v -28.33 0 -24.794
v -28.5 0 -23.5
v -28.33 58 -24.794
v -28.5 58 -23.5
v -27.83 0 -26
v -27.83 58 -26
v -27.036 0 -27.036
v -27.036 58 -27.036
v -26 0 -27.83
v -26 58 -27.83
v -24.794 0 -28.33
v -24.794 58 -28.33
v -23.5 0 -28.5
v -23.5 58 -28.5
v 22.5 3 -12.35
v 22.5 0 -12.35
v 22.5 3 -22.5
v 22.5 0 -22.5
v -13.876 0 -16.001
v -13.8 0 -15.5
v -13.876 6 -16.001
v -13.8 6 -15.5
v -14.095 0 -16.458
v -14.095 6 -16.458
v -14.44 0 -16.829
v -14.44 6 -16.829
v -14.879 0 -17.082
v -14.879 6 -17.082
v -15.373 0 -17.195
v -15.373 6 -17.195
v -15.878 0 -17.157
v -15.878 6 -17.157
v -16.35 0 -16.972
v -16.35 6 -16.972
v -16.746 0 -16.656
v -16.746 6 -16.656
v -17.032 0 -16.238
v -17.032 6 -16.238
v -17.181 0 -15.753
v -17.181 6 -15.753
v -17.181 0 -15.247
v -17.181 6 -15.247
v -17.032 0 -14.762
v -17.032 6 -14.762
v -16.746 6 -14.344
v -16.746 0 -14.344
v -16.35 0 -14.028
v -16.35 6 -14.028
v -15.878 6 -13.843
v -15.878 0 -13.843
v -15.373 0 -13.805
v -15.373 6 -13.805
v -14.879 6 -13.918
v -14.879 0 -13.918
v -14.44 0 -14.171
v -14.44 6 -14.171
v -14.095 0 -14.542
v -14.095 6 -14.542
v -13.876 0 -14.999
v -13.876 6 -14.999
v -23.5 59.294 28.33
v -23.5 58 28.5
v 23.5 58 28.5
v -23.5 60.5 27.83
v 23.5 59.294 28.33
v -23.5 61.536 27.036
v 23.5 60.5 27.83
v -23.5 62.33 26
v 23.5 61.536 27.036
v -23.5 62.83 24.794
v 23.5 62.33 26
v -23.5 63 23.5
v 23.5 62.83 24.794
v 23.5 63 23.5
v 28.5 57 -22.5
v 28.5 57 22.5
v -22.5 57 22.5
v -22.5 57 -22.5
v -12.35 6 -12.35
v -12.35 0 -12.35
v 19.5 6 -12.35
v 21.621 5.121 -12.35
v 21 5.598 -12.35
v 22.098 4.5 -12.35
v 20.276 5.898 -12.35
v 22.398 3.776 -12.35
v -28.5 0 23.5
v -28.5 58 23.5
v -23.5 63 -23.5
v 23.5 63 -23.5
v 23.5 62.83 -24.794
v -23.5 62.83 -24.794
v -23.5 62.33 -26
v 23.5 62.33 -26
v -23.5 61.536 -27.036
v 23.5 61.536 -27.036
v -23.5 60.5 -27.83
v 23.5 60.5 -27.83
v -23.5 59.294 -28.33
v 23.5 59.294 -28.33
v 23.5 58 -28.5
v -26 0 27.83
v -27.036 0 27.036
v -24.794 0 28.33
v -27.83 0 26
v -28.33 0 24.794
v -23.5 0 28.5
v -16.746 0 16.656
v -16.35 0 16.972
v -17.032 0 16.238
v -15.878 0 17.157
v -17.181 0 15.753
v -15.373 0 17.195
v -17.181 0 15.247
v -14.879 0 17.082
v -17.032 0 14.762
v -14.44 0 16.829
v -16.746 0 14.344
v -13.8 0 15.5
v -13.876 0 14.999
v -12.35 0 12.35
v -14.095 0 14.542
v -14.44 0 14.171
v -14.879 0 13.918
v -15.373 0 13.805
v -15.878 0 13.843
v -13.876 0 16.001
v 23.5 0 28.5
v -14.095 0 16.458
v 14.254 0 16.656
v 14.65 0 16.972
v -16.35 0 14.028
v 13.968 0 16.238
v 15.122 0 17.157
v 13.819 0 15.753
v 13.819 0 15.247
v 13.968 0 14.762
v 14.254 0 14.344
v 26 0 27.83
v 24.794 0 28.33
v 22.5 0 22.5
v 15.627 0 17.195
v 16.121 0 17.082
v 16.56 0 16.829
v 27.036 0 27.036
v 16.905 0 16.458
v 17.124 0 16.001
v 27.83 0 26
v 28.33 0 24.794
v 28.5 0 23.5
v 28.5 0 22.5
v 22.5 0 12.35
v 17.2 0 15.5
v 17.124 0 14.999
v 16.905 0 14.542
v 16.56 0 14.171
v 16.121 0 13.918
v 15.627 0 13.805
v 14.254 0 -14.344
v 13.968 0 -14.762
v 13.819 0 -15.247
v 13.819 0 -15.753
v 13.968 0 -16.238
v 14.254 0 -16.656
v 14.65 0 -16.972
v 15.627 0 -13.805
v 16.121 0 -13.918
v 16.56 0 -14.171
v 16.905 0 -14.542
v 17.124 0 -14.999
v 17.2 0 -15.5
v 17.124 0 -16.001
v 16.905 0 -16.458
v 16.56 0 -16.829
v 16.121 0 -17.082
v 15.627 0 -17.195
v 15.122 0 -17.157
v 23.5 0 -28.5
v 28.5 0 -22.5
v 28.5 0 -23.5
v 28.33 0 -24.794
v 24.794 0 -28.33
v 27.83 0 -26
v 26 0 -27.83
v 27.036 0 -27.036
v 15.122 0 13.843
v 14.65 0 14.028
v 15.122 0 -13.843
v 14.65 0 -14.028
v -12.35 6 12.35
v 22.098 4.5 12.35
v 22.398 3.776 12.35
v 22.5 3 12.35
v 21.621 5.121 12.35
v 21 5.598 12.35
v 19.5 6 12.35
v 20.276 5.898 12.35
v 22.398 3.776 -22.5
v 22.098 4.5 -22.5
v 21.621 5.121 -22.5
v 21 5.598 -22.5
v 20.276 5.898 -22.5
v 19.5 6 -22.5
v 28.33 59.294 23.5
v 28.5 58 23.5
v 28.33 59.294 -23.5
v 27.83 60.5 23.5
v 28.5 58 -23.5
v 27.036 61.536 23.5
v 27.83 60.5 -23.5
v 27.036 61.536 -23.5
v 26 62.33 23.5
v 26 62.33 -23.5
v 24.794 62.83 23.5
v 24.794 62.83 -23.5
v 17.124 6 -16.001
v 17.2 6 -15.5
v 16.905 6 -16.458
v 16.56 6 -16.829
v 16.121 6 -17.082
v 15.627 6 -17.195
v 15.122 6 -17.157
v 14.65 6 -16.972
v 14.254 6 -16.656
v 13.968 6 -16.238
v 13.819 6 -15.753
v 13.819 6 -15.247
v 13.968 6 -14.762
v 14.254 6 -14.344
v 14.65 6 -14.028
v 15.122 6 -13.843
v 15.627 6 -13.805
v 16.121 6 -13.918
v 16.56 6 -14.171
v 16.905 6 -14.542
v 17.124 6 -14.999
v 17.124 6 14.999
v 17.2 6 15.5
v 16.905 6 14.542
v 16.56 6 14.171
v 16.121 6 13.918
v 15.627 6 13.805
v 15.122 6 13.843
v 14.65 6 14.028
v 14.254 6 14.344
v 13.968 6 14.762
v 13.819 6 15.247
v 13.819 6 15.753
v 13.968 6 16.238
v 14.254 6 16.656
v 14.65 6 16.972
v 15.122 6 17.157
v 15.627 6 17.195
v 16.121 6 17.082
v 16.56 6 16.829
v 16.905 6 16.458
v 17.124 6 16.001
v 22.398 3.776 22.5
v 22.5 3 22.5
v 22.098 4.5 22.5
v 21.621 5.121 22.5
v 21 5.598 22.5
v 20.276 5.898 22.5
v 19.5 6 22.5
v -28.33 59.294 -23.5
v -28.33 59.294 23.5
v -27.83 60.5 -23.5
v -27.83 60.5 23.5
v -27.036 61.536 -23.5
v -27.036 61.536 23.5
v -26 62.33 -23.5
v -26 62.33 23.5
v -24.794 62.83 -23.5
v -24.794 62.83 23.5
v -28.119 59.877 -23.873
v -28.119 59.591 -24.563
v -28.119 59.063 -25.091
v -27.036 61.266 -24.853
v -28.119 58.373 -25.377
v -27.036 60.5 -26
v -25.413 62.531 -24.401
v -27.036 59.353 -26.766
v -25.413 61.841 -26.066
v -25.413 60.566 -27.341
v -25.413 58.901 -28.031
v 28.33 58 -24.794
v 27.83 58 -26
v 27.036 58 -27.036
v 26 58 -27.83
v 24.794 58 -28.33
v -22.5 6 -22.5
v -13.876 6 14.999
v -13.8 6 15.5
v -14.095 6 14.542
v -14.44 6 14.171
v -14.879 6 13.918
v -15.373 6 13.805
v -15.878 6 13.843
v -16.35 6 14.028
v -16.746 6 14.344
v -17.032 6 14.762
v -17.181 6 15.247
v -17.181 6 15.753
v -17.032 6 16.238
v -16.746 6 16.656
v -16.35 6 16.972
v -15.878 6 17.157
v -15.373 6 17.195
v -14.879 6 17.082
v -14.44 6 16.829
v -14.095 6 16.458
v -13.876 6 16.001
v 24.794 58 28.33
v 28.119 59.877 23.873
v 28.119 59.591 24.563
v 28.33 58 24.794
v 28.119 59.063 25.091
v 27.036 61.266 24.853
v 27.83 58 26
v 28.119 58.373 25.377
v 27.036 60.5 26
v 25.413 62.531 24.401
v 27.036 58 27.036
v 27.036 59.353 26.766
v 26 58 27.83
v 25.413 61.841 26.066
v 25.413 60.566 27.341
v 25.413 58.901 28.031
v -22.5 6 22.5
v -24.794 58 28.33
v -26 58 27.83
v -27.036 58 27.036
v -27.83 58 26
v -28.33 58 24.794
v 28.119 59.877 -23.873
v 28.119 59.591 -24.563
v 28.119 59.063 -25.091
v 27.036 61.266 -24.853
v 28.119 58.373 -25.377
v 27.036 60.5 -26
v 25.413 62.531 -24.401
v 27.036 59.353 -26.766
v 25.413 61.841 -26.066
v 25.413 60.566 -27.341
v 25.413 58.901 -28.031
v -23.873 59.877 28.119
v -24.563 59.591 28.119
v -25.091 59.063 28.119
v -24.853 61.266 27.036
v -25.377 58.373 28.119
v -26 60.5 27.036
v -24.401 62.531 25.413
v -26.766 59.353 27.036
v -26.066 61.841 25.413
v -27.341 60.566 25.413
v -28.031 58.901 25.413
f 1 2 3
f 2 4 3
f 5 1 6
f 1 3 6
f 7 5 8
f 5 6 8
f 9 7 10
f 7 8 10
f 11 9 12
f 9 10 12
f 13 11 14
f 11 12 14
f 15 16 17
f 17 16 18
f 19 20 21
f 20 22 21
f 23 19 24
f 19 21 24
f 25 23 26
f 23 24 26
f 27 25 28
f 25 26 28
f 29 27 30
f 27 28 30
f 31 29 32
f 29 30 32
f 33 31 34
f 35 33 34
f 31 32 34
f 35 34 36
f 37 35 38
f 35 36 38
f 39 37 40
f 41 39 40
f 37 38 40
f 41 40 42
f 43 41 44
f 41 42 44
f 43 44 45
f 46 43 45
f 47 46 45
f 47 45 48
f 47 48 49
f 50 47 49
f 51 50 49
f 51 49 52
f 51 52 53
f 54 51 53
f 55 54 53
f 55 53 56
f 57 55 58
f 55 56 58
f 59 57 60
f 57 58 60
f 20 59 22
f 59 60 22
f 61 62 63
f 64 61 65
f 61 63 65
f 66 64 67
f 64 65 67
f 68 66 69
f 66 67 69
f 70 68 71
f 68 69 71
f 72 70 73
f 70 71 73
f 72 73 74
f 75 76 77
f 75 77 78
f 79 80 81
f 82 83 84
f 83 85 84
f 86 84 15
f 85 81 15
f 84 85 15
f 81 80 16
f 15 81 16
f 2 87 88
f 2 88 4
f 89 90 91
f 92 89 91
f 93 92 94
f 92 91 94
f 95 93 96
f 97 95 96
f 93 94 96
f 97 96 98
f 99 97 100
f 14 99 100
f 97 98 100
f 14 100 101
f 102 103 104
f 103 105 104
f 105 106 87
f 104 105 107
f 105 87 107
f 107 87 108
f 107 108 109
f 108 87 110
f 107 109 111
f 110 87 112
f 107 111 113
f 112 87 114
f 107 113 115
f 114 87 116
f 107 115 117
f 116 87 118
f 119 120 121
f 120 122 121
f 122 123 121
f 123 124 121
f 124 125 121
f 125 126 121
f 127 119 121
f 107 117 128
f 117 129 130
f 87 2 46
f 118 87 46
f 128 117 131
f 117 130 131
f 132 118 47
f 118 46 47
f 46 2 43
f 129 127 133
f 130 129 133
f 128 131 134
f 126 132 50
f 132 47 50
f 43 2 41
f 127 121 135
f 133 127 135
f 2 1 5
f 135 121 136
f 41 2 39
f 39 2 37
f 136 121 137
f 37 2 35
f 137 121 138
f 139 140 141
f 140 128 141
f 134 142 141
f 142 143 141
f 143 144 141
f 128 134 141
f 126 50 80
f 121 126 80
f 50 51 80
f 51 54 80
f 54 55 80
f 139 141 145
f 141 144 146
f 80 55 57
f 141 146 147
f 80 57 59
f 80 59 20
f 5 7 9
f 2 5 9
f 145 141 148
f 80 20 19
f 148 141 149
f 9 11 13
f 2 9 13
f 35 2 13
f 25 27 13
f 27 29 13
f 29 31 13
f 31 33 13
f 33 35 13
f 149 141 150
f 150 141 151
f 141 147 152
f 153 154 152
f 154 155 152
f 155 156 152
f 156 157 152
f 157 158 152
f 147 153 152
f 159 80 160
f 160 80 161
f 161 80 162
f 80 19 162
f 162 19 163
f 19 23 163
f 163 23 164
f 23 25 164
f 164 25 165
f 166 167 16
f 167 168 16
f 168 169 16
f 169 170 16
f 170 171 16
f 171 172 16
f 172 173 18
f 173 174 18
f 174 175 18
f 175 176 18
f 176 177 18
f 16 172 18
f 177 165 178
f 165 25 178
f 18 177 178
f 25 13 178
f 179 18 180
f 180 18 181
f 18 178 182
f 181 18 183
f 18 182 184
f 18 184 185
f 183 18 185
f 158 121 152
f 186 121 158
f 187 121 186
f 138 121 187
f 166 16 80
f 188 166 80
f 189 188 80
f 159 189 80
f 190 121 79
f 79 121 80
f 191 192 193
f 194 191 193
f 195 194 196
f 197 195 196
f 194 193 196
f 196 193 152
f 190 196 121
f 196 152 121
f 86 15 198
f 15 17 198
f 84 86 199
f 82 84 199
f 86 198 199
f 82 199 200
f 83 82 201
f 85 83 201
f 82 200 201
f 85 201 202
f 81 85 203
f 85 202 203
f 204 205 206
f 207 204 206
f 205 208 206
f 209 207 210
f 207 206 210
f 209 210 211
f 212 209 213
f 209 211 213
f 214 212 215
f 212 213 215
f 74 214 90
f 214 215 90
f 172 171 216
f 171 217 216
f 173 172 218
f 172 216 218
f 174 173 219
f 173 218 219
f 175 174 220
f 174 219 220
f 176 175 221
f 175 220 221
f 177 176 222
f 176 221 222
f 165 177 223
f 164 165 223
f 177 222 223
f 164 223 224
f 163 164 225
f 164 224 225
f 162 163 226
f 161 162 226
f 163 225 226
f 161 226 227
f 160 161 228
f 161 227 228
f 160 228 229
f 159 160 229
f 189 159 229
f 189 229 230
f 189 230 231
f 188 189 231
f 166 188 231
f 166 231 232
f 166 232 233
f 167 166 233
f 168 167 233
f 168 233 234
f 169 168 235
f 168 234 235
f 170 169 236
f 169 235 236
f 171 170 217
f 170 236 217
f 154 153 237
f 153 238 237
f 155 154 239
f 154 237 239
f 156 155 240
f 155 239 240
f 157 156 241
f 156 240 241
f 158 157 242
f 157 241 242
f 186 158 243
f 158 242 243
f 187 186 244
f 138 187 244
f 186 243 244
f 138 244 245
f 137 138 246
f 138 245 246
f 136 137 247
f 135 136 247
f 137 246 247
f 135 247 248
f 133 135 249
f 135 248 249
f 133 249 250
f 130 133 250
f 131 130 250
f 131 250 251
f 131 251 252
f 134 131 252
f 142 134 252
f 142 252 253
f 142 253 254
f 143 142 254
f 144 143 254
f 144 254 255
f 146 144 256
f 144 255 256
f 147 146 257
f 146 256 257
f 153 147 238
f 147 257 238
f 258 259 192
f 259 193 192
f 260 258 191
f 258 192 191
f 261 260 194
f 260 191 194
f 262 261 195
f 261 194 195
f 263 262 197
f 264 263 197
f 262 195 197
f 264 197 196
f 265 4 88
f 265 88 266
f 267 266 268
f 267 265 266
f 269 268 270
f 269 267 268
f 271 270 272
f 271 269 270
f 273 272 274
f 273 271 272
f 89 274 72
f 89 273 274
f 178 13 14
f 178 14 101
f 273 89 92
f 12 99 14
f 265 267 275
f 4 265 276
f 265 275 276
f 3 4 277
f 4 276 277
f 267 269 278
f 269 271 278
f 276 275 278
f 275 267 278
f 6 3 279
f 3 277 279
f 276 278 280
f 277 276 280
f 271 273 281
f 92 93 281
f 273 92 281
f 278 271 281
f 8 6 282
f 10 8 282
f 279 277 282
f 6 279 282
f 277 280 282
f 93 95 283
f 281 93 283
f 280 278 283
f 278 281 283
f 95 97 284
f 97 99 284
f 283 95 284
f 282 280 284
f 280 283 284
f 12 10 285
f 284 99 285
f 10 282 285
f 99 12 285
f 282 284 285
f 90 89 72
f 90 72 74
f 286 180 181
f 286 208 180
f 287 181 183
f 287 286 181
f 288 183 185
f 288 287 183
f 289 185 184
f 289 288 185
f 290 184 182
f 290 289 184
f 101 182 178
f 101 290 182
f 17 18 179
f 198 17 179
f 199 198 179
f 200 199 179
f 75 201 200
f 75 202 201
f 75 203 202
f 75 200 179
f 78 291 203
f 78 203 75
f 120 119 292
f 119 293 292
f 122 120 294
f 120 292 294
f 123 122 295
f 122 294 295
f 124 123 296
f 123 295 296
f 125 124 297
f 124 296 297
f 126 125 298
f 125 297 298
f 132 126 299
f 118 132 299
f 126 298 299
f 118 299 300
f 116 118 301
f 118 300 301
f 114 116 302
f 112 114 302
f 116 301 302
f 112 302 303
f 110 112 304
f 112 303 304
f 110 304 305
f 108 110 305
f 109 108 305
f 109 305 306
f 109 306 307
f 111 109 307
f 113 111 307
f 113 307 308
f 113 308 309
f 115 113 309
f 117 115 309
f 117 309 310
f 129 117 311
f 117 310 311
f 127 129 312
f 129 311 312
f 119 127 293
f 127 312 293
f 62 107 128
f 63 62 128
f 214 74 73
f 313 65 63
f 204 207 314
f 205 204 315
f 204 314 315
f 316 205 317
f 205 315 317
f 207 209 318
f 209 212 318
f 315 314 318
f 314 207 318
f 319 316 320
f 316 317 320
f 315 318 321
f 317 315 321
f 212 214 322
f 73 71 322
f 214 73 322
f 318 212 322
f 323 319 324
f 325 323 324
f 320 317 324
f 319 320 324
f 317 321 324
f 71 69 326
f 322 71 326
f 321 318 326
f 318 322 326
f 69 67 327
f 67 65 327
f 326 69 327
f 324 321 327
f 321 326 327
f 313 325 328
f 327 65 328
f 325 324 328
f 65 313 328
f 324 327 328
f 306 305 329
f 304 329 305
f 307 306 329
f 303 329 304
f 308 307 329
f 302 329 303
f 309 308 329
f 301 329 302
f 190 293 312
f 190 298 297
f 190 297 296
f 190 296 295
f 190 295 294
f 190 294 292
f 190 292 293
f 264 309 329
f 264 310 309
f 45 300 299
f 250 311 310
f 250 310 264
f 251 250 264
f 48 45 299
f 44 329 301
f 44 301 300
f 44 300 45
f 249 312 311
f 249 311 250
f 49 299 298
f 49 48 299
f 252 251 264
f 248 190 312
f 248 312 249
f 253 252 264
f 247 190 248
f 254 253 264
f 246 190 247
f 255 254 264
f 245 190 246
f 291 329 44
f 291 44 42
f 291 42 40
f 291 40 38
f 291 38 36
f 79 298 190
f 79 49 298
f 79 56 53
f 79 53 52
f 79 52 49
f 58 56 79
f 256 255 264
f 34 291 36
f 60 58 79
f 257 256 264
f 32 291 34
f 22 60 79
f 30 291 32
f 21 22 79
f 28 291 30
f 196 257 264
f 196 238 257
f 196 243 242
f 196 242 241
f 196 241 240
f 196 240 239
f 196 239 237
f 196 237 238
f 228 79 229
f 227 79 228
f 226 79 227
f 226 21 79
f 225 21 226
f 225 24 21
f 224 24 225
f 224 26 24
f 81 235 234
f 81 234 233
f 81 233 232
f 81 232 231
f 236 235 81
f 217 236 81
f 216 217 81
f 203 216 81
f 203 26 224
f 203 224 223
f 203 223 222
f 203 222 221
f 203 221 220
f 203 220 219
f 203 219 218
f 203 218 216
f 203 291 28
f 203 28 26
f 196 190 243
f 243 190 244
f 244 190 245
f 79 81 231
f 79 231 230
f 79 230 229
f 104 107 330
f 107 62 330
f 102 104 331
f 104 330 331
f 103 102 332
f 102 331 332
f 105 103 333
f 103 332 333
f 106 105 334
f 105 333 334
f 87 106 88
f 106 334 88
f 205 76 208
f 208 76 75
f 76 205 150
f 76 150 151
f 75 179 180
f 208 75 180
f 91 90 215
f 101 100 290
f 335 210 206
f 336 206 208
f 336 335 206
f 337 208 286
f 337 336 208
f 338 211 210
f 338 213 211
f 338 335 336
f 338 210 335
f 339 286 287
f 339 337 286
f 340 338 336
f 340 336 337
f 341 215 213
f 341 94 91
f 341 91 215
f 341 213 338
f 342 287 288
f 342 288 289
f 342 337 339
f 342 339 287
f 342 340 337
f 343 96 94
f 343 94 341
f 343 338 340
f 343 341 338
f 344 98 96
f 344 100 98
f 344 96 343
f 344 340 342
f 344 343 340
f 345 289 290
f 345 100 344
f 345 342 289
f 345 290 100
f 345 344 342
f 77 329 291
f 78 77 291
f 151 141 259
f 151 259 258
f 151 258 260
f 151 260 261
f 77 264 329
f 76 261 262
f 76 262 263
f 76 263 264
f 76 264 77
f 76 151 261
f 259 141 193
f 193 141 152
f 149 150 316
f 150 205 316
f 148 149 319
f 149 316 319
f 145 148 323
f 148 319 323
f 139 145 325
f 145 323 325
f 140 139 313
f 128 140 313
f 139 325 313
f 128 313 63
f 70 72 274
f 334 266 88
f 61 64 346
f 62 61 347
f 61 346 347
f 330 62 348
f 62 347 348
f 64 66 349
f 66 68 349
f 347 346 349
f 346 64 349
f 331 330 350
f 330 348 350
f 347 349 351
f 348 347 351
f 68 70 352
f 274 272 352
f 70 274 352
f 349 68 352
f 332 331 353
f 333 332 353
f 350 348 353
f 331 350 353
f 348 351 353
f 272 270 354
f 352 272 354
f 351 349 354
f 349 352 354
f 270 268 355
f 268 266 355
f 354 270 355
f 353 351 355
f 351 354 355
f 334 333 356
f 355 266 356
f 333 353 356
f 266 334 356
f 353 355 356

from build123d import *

# Parameters (mm, degrees)
SKETCH1_W                 = 57
SKETCH1_H                 = 57
BOSS_EXTRUDE3_DEPTH       = 63
SKETCH3_W                 = 45
SKETCH3_H                 = 57
CUT_EXTRUDE2_DEPTH        = 29.5
CUT_EXTRUDE2_DEPTH_BACK   = 22.5
BOSS_EXTRUDE4_DEPTH       = 6
F_5_0MM_DOWEL_HOLE1_D     = 3.4
F_5_0MM_DOWEL_HOLE1_DEPTH = 6
F_5_0MM_DOWEL_HOLE1_TIP   = 1.021463052
FILLET1_R                 = 5
FILLET2_R                 = 3


with BuildPart() as part:
    # Sketch1 → Boss-Extrude3 (new body)
    with BuildSketch(Plane(origin=(0, 0, 0), x_dir=(1, 0, 0), z_dir=(0, 1, 0))):
        Rectangle(SKETCH1_W, SKETCH1_H)
    extrude(amount=BOSS_EXTRUDE3_DEPTH)

    # Sketch3 → Cut-Extrude2 (cut, two sides)
    with BuildSketch(Plane(origin=(0, 0, 0), x_dir=(0, 0, -1), z_dir=(1, 0, 0))) as cut_extrude2_sk:
        with Locations((0, 28.5)):
            Rectangle(SKETCH3_W, SKETCH3_H)
    extrude(amount=CUT_EXTRUDE2_DEPTH, mode=Mode.SUBTRACT)
    extrude(cut_extrude2_sk.sketch, amount=-CUT_EXTRUDE2_DEPTH_BACK, mode=Mode.SUBTRACT)

    # Sketch1<6> → Boss-Extrude4 (add)
    with BuildSketch(Plane(origin=(0, 0, 0), x_dir=(1, 0, 0), z_dir=(0, 1, 0))):
        Polygon((22.5, 22.5), (-22.5, 22.5), (-22.5, -22.5), (22.5, -22.5), (22.5, -12.350491759), (-12.350491759, -12.350491759), (-12.350491759, 12.350491759), (22.5, 12.350491759), align=None)
    extrude(amount=BOSS_EXTRUDE4_DEPTH)

    # Ø5.0mm Dowel Hole1
    with Locations(Plane(origin=(0, 0, 0), x_dir=(-1, 0, 0), z_dir=(0, -1, 0))):
        with Locations((15.5, -15.5), (15.5, 15.5), (-15.5, 15.5), (-15.5, -15.5)):
            Hole(F_5_0MM_DOWEL_HOLE1_D / 2, depth=F_5_0MM_DOWEL_HOLE1_DEPTH)
            with Locations((0, 0, -(F_5_0MM_DOWEL_HOLE1_DEPTH + F_5_0MM_DOWEL_HOLE1_TIP / 2))):  # 118° drill point
                Cone(0, F_5_0MM_DOWEL_HOLE1_D / 2, F_5_0MM_DOWEL_HOLE1_TIP, mode=Mode.SUBTRACT)

    # Fillet1
    fillet1_edges = [part.edges().sort_by_distance(p)[0] for p in [
        (0, 63, -28.5),
        (-28.5, 63, 0),
        (0, 63, 28.5),
        (28.5, 63, 0),
        (28.5, 31.5, 28.5),
        (-28.5, 31.5, 28.5),
        (-28.5, 31.5, -28.5),
        (28.5, 31.5, -28.5),
    ]]
    fillet(fillet1_edges, radius=FILLET1_R)

    # Fillet2
    fillet2_edges = [part.edges().sort_by_distance(p)[0] for p in [
        (22.5, 6, -17.425245879),
        (22.5, 6, 17.425245879),
    ]]
    fillet(fillet2_edges, radius=FILLET2_R)


solid = part.part
